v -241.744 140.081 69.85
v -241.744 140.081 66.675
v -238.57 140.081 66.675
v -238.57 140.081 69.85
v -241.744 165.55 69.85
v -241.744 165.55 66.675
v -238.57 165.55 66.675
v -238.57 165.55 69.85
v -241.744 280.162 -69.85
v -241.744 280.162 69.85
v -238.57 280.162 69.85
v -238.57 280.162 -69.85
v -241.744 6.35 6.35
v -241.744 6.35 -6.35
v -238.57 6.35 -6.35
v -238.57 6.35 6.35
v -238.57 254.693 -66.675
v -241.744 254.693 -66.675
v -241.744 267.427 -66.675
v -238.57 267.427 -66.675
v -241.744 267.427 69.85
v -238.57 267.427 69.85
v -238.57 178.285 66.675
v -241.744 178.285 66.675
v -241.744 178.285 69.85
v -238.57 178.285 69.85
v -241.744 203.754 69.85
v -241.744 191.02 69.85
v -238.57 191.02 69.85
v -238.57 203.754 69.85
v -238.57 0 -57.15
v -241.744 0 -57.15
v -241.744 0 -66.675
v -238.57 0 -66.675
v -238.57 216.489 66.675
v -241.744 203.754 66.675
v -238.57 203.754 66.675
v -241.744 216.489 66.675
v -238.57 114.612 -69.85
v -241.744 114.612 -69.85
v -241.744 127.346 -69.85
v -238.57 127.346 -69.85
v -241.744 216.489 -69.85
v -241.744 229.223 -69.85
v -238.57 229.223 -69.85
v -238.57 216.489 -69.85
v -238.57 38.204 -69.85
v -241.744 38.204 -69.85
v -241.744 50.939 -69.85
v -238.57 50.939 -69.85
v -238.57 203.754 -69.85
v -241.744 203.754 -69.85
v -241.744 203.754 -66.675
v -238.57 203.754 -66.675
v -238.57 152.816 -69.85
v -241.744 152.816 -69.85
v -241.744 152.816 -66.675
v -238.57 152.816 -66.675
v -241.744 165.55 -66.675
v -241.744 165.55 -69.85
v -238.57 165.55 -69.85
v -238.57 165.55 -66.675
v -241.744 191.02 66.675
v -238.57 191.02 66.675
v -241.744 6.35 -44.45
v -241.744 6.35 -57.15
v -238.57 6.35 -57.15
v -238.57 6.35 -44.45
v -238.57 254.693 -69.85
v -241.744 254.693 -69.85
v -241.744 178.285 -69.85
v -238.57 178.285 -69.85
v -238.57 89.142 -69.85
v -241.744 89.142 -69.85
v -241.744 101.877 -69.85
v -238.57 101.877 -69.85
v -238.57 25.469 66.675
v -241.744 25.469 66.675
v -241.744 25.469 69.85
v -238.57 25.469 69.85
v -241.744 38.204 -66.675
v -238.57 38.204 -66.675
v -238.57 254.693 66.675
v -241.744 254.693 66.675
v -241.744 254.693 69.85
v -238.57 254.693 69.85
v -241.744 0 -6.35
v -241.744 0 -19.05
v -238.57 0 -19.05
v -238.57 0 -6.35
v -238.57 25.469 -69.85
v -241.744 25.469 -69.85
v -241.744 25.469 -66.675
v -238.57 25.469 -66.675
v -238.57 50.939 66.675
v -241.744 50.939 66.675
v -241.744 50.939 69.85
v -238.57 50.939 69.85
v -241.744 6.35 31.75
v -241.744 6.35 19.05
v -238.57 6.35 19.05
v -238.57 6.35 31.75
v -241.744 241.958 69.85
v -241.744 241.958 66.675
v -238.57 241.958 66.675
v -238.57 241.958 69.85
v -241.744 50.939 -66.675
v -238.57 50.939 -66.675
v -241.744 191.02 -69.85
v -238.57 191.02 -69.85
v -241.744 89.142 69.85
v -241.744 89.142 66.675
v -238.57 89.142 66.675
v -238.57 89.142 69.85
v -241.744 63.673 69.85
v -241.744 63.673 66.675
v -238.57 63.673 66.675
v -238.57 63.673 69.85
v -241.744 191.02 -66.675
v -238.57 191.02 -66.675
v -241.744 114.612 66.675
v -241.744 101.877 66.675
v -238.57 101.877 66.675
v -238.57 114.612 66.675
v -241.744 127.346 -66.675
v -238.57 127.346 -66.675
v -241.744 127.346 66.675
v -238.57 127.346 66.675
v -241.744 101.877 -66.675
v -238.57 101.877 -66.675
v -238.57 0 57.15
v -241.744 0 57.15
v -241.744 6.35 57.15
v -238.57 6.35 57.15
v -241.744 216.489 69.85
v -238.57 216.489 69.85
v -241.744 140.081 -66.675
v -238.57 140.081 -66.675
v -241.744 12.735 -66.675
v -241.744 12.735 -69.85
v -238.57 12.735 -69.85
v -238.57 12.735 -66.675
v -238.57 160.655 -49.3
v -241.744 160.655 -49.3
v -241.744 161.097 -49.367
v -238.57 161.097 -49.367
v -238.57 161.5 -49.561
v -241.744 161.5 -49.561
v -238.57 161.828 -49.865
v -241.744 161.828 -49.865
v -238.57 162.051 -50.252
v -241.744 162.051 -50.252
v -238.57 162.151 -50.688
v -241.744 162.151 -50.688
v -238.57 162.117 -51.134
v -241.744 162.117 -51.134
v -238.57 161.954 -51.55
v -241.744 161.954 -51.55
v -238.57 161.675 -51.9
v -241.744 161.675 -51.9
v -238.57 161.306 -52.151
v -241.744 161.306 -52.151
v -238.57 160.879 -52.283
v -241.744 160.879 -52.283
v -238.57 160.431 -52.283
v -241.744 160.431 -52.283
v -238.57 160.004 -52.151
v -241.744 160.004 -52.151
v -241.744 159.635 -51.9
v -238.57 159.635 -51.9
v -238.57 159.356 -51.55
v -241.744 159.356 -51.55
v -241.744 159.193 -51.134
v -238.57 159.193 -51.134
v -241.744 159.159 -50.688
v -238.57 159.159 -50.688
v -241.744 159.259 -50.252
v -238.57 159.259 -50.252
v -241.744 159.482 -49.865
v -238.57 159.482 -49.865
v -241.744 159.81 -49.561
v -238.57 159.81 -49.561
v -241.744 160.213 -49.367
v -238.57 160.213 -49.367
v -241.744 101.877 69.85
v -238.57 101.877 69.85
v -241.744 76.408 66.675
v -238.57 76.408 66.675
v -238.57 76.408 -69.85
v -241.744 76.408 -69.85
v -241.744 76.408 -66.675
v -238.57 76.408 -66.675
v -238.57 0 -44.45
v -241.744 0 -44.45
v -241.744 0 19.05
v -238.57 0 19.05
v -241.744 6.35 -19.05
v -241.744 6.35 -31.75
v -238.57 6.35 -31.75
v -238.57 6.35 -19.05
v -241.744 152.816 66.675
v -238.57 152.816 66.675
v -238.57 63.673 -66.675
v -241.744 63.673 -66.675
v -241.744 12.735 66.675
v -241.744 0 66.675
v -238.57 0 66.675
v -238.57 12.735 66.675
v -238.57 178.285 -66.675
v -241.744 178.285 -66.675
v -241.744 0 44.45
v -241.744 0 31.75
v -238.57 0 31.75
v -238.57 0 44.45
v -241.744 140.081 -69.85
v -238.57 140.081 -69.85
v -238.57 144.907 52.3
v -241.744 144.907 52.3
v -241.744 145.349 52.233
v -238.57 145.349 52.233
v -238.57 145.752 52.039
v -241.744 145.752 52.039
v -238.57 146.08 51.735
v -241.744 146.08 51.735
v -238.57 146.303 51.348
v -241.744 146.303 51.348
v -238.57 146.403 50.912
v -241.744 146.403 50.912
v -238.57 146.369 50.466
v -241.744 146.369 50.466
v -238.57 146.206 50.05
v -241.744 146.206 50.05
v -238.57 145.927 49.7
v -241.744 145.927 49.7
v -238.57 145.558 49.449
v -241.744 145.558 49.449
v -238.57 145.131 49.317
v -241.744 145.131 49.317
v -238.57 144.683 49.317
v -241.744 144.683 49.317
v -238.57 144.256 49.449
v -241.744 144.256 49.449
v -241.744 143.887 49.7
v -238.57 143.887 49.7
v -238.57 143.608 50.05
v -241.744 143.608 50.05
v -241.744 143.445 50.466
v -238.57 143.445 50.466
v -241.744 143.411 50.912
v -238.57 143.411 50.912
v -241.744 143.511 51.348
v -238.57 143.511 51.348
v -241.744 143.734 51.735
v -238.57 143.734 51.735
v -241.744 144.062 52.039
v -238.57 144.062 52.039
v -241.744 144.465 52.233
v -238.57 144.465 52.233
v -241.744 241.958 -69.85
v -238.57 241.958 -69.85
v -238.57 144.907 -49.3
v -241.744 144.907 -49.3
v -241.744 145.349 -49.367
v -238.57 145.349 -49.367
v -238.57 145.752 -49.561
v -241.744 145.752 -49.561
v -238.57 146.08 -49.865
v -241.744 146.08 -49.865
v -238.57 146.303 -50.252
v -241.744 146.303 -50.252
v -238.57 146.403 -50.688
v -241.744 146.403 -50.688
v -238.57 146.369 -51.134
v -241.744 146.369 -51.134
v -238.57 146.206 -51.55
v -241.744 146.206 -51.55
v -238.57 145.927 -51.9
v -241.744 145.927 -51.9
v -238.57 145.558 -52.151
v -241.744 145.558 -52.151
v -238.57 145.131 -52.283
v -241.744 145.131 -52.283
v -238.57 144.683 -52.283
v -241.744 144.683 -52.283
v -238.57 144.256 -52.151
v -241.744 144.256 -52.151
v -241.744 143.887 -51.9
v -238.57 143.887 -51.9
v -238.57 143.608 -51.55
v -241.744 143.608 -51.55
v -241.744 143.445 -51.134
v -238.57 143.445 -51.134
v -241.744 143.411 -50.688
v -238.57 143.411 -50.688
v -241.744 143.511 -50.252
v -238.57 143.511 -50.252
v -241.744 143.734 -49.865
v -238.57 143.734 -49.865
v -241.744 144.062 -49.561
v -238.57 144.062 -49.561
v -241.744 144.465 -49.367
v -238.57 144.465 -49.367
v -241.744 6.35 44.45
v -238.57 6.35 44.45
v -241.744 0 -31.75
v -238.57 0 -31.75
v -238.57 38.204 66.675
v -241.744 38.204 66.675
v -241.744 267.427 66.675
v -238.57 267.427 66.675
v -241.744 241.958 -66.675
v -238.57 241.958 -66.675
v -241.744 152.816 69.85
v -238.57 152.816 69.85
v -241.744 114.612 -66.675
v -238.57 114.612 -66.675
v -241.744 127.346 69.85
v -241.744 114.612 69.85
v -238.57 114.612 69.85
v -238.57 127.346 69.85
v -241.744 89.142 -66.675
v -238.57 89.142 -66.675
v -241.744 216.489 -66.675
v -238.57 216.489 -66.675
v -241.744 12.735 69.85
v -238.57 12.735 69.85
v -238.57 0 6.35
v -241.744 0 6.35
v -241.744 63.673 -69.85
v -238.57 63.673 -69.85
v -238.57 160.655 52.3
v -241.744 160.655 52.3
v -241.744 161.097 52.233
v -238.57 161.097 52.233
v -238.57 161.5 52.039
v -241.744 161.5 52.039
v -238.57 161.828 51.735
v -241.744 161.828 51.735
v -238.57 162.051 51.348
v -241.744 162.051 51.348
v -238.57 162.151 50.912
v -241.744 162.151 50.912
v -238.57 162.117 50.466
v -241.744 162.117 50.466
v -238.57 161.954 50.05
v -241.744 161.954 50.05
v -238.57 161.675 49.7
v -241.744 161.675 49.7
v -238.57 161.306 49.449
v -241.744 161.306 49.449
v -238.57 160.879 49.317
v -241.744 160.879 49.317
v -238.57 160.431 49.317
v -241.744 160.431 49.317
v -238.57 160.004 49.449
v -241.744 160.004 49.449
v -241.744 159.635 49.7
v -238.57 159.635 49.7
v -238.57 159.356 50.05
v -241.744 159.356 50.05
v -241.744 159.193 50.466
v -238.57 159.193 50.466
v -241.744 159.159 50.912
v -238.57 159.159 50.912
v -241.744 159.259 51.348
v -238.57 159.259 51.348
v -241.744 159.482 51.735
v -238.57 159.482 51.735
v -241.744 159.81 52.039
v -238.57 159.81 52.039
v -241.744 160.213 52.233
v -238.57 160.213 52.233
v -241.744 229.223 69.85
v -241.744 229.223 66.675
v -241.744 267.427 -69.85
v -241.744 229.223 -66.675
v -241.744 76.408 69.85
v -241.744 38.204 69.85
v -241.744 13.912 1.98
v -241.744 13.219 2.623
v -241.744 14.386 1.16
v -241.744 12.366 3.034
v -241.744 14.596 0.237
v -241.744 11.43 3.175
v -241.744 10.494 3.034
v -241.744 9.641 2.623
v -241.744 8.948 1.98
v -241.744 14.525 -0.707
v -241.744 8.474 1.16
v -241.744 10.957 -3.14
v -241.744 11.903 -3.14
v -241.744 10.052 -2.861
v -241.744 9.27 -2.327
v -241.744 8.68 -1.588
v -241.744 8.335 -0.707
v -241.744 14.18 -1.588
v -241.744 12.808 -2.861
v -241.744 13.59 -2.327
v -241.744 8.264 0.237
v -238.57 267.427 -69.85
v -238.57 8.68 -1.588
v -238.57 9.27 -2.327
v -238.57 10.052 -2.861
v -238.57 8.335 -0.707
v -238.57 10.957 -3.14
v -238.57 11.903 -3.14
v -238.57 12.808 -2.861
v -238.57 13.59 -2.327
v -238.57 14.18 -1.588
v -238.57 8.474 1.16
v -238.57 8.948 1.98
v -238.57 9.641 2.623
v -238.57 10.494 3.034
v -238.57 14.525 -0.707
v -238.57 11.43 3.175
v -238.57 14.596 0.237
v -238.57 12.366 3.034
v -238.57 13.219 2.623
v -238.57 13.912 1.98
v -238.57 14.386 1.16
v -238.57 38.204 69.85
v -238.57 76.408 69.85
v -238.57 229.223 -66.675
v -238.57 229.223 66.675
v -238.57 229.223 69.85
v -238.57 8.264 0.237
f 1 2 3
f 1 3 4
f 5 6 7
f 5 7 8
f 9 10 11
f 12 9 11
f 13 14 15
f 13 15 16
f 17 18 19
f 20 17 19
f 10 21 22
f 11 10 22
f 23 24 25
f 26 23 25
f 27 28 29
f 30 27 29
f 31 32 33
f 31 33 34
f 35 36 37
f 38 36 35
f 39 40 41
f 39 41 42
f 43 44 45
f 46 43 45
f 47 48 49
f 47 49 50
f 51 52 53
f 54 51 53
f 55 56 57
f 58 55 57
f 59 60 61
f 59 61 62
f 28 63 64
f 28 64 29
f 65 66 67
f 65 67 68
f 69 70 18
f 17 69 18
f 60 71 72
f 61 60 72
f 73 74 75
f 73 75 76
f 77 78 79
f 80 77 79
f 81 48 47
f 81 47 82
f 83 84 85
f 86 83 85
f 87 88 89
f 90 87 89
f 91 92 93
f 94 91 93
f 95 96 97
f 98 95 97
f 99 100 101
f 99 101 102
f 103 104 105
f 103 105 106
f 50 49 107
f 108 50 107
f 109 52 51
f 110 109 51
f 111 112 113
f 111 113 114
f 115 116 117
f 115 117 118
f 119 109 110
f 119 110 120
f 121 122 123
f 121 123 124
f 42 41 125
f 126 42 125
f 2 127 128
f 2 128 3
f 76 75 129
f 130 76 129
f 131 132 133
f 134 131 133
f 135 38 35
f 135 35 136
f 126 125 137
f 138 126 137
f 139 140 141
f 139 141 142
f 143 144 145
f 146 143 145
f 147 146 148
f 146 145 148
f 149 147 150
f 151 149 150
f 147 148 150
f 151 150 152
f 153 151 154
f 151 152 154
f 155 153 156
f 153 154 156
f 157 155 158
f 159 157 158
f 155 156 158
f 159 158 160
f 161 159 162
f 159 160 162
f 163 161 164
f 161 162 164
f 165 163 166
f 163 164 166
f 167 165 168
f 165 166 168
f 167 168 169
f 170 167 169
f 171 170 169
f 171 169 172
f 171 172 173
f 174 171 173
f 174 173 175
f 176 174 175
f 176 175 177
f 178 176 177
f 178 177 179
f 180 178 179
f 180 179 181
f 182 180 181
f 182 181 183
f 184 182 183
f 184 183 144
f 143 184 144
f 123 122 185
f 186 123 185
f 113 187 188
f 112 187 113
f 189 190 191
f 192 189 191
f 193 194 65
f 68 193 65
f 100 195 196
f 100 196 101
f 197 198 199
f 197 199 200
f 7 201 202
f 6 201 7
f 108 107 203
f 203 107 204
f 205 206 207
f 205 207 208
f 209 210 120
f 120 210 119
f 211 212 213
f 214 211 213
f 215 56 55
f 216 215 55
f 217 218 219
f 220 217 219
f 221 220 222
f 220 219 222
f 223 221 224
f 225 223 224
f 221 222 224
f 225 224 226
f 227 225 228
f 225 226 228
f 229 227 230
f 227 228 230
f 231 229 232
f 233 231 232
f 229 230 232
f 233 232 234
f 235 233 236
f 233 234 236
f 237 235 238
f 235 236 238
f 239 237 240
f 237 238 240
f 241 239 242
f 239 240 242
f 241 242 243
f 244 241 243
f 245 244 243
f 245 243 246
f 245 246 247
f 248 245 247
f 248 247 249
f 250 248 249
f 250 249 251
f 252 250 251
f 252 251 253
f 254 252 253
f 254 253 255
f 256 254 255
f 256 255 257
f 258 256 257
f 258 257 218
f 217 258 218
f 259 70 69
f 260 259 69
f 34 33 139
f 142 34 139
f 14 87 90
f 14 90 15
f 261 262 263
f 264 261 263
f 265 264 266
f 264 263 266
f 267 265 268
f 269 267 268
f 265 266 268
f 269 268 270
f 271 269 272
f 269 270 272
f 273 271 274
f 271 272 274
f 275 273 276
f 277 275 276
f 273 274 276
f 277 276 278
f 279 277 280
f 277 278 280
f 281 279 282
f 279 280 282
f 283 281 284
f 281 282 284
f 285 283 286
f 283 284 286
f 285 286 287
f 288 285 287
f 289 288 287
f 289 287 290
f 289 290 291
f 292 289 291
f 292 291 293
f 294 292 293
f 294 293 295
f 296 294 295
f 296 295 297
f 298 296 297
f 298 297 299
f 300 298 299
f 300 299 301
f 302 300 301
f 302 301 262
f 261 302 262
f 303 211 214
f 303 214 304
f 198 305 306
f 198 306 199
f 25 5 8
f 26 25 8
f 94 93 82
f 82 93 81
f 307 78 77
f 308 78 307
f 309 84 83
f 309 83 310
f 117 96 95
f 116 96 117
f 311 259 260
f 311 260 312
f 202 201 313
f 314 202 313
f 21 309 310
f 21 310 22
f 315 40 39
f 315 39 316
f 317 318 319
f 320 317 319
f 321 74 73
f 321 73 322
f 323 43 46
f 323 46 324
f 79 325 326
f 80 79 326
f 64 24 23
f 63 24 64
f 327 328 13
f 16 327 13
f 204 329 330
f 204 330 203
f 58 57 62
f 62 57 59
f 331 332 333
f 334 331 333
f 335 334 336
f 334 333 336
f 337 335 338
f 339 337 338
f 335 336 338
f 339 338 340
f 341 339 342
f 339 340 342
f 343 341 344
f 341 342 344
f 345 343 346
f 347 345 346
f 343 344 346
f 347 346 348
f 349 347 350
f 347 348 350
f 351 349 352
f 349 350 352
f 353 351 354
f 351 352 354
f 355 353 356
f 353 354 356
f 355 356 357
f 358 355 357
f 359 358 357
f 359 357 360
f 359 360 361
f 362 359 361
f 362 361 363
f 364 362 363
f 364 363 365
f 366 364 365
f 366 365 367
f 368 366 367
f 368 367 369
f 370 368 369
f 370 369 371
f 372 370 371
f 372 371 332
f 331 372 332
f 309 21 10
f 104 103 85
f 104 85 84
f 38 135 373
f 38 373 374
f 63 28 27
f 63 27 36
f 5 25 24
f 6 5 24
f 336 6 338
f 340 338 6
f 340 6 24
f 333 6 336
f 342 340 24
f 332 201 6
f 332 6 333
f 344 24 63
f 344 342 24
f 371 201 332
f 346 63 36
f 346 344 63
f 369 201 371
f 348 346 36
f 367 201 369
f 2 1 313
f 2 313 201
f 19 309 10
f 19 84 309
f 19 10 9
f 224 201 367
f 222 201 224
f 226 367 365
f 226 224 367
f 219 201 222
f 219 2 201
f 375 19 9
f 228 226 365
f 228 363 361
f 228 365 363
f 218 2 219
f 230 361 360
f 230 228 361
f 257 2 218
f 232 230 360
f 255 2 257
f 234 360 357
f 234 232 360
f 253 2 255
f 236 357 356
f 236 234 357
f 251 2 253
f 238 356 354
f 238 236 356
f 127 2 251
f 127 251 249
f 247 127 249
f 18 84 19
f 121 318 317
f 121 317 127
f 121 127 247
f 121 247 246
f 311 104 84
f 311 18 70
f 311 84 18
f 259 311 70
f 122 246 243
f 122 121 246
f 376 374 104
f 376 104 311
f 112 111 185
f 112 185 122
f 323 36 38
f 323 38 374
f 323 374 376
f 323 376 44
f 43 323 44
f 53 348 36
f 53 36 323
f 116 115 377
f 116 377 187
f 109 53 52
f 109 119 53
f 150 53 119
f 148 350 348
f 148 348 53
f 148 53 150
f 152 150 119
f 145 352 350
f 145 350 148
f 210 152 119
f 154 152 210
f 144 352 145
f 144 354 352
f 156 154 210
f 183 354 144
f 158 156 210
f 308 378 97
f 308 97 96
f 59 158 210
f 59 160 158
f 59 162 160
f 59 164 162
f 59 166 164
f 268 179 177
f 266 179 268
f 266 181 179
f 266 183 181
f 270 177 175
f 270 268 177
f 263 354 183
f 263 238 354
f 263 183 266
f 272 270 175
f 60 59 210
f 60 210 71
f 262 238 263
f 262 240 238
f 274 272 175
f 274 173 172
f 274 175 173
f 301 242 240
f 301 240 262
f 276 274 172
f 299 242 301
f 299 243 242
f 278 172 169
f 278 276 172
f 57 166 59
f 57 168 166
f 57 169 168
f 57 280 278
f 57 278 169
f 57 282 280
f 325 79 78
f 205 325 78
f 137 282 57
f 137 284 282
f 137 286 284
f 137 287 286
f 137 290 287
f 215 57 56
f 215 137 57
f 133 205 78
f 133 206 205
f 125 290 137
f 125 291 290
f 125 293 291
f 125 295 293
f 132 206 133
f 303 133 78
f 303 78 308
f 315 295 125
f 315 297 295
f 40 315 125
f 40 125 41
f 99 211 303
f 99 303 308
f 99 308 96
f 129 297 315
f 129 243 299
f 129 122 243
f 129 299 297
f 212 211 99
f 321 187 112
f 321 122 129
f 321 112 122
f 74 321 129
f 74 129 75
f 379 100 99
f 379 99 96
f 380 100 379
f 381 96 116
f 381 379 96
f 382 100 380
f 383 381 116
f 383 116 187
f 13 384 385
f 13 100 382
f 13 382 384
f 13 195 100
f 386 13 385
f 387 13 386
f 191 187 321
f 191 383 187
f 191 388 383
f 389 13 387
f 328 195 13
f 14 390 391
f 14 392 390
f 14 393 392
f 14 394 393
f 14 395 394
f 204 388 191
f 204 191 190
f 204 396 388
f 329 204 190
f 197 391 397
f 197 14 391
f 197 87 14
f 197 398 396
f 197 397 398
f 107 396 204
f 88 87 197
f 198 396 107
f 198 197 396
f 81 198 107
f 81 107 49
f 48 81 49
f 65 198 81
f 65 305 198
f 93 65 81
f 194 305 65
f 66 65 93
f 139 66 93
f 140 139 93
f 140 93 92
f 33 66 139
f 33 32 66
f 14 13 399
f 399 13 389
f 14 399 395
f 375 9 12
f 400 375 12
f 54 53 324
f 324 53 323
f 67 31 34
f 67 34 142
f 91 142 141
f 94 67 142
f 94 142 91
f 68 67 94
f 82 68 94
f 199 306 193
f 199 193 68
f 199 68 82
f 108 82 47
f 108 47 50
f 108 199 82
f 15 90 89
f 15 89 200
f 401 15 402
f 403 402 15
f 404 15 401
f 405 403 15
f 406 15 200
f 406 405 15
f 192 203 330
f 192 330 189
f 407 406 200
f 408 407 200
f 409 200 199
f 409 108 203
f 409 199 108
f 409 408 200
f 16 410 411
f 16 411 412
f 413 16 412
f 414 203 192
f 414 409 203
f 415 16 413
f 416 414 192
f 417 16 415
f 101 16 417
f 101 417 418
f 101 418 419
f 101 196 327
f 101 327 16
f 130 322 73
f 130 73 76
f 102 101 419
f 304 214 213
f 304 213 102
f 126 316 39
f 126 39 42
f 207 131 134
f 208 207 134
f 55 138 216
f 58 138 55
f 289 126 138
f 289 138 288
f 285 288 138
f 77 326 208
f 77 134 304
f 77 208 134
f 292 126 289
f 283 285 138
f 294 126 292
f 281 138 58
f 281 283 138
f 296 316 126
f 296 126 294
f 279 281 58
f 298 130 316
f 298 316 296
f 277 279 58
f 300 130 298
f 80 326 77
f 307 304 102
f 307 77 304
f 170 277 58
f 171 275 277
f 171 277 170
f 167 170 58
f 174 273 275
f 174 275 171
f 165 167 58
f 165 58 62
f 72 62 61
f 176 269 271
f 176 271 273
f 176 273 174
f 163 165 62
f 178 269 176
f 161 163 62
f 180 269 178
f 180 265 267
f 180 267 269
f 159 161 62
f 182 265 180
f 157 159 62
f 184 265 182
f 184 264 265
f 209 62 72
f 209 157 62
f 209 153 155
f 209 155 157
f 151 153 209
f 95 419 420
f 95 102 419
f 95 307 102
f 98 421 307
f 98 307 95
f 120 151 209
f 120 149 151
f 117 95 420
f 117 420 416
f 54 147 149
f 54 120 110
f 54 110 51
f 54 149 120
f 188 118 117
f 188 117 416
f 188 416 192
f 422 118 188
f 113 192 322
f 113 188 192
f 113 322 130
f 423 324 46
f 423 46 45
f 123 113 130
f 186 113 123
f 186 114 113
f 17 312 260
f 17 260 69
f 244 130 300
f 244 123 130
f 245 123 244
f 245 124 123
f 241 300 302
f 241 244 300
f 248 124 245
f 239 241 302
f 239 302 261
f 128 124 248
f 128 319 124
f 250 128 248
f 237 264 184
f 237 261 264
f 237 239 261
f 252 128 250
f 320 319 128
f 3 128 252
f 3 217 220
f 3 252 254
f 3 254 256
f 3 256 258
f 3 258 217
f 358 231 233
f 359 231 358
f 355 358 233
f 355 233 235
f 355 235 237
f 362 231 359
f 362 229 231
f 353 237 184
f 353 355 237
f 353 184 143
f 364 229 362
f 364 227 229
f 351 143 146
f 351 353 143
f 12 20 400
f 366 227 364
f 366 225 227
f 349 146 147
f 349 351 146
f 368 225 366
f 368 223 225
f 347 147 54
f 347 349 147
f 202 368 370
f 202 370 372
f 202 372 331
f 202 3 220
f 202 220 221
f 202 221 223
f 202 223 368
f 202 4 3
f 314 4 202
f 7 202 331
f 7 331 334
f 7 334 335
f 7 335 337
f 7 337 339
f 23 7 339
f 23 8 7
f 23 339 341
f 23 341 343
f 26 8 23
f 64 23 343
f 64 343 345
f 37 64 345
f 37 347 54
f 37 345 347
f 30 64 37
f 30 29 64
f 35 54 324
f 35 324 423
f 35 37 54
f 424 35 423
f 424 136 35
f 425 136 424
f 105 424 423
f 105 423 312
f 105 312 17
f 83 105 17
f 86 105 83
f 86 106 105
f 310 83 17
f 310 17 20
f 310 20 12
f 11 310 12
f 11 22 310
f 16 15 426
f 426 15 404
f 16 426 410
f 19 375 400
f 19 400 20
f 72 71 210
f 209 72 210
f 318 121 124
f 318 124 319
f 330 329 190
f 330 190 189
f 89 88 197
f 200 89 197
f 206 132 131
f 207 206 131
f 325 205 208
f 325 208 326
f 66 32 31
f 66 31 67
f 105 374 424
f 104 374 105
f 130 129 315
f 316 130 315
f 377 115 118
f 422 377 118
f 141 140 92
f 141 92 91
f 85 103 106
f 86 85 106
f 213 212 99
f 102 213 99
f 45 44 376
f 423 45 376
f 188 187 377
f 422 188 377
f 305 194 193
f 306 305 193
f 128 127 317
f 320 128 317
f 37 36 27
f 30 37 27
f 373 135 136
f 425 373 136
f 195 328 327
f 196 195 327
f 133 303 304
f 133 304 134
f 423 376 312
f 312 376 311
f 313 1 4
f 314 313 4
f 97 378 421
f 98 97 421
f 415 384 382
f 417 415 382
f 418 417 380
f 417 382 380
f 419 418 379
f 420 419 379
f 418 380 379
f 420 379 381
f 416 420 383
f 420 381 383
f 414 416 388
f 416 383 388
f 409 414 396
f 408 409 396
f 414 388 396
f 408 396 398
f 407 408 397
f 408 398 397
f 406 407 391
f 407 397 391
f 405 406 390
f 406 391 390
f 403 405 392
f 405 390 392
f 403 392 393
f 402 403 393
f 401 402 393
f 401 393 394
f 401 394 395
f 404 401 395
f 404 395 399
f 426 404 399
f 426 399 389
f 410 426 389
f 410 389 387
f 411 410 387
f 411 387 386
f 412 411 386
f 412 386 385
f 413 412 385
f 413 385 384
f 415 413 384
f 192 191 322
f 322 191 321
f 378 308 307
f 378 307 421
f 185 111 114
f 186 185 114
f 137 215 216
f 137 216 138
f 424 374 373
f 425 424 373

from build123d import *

# Parameters (mm, degrees)
SKETCH1_W                   = 483.489
SKETCH1_H                   = 139.7
BOSS_EXTRUDE1_DEPTH         = 6.35
SKETCH2_W                   = 483.489
SKETCH2_H                   = 139.7
SKETCH2_W_2                 = 477.139
SKETCH2_H_2                 = 133.35
BOSS_EXTRUDE2_DEPTH         = 299.212
SKETCH3_W                   = 5.588
SKETCH3_H                   = 16.933333333
SKETCH3_H_2                 = 16.933333334
DOOR_SLOT_DEPTH             = 12.7
SKETCH4_W                   = 6.35
SKETCH4_H                   = 15.9512
DOOR_GUIDE_HOLES_DEPTH      = 3.175
LEVERHOLE_CUT_REACH         = 141.7
LEVER_HOLES_R               = 1.5
LEVER_HOLES_W               = 25.4
LEVER_HOLES_H               = 7.62
LEVER_HOLES_W_2             = 4
LEVER_HOLES_H_2             = 6.35
LEVER_HOLES_2_R             = 1.5
LBRACKET_THRU_HOLES_DEPTH   = 140.7
SKETCH8_R                   = 3.175
TETHER_HOLE_DEPTH           = 484.489
DOOR_GUIDE_ROOF_SLOTS_REACH = 141.7
SKETCH16_W                  = 9.525
SKETCH16_H                  = 15.744198015
SKETCH16_W_2                = 483.489
SKETCH16_H_2                = 25.4
SKETCH17_W                  = 480.314
SKETCH17_H                  = 280.162
CUT_EXTRUDE1_DEPTH          = 140.7
LEFT_RIGHT_W                = 12.7
LEFT_RIGHT_H                = 6.35
LEFT_RIGHT_W_2              = 3.175
LEFT_RIGHT_H_2              = 12.734636364
LEFT_RIGHT_H_3              = 12.734636363
CUT_EXTRUDE2_DEPTH          = 4.175
SKETCH18_R                  = 1.499997
CUT_EXTRUDE3_DEPTH          = 4.175


with BuildPart() as part:
    # Sketch1 → Boss-Extrude1 (new body)
    with BuildSketch(Plane(origin=(0, 0, 0), x_dir=(1, 0, 0), z_dir=(0, 1, 0))):
        Rectangle(SKETCH1_W, SKETCH1_H)
    extrude(amount=BOSS_EXTRUDE1_DEPTH)

    # Sketch2 → Boss-Extrude2 (add)
    with BuildSketch(Plane(origin=(0, 6.35, 0), x_dir=(1, 0, 0), z_dir=(0, 1, 0))):
        Rectangle(SKETCH2_W, SKETCH2_H)
        Rectangle(SKETCH2_W_2, SKETCH2_H_2, mode=Mode.SUBTRACT)
    extrude(amount=BOSS_EXTRUDE2_DEPTH)

    # Sketch3 → Door Slot (cut)
    with BuildSketch(Plane.XY.offset(69.85)):
        with BuildLine():
            Line((76.5175, 292.354), (76.5175, 6.35))
            Line((76.5175, 6.35), (83.1215, 6.35))
            Line((83.1215, 6.35), (83.1215, 283.240675824))
            ThreePointArc((83.1215, 283.240675824), (83.865448776, 285.036727048), (85.6615, 285.780675824))
            Line((85.6615, 285.780675824), (96.0755, 285.780675824))
            Line((96.0755, 285.780675824), (96.0755, 292.354))
            Line((96.0755, 292.354), (76.5175, 292.354))
        make_face()
        with Locations((66.6115, 80.433333334)):
            Rectangle(SKETCH3_W, SKETCH3_H)
        with Locations((66.6115, 50.8)):
            Rectangle(SKETCH3_W, SKETCH3_H_2)
        with Locations((66.6115, 21.166666667)):
            Rectangle(SKETCH3_W, SKETCH3_H)
        with BuildLine():
            Line((-83.1215, 283.240675824), (-83.1215, 6.35))
            Line((-83.1215, 6.35), (-76.5175, 6.35))
            Line((-76.5175, 6.35), (-76.5175, 292.354))
            Line((-76.5175, 292.354), (-96.0755, 292.354))
            Line((-96.0755, 292.354), (-96.0755, 285.780675824))
            Line((-96.0755, 285.780675824), (-85.6615, 285.780675824))
            ThreePointArc((-85.6615, 285.780675824), (-83.865448776, 285.036727048), (-83.1215, 283.240675824))
        make_face()
        with Locations((-66.6115, 80.433333334)):
            Rectangle(SKETCH3_W, SKETCH3_H)
        with Locations((-66.6115, 50.8)):
            Rectangle(SKETCH3_W, SKETCH3_H_2)
        with Locations((-66.6115, 21.166666667)):
            Rectangle(SKETCH3_W, SKETCH3_H)
    extrude(amount=-DOOR_SLOT_DEPTH, mode=Mode.SUBTRACT)

    # Sketch4 → Door Guide Holes (cut)
    with BuildSketch(Plane.XY.offset(-66.675)):
        with Locations((73.3425, 256.2352)):
            Rectangle(SKETCH4_W, SKETCH4_H)
        with Locations((73.3425, 227.584)):
            Rectangle(SKETCH4_W, SKETCH4_H)
        with Locations((73.3425, 198.9328)):
            Rectangle(SKETCH4_W, SKETCH4_H)
        with Locations((73.3425, 170.2816)):
            Rectangle(SKETCH4_W, SKETCH4_H)
        with Locations((73.3425, 141.6304)):
            Rectangle(SKETCH4_W, SKETCH4_H)
        with Locations((73.3425, 112.9792)):
            Rectangle(SKETCH4_W, SKETCH4_H)
        with Locations((73.3425, 84.328)):
            Rectangle(SKETCH4_W, SKETCH4_H)
        with Locations((73.3425, 55.6768)):
            Rectangle(SKETCH4_W, SKETCH4_H)
        with Locations((73.3425, 27.0256)):
            Rectangle(SKETCH4_W, SKETCH4_H)
        with Locations((-99.2505, 284.8864)):
            Rectangle(SKETCH4_W, SKETCH4_H)
        with Locations((-99.2505, 256.2352)):
            Rectangle(SKETCH4_W, SKETCH4_H)
        with Locations((-99.2505, 227.584)):
            Rectangle(SKETCH4_W, SKETCH4_H)
        with Locations((-99.2505, 198.9328)):
            Rectangle(SKETCH4_W, SKETCH4_H)
        with Locations((-99.2505, 170.2816)):
            Rectangle(SKETCH4_W, SKETCH4_H)
        with Locations((-99.2505, 141.6304)):
            Rectangle(SKETCH4_W, SKETCH4_H)
        with Locations((-99.2505, 112.9792)):
            Rectangle(SKETCH4_W, SKETCH4_H)
        with Locations((-99.2505, 84.328)):
            Rectangle(SKETCH4_W, SKETCH4_H)
        with Locations((-99.2505, 55.6768)):
            Rectangle(SKETCH4_W, SKETCH4_H)
        with Locations((-99.2505, 27.0256)):
            Rectangle(SKETCH4_W, SKETCH4_H)
        with Locations((99.2505, 284.8864)):
            Rectangle(SKETCH4_W, SKETCH4_H)
        with Locations((99.2505, 256.2352)):
            Rectangle(SKETCH4_W, SKETCH4_H)
        with Locations((99.2505, 227.584)):
            Rectangle(SKETCH4_W, SKETCH4_H)
        with Locations((99.2505, 198.9328)):
            Rectangle(SKETCH4_W, SKETCH4_H)
        with Locations((99.2505, 170.2816)):
            Rectangle(SKETCH4_W, SKETCH4_H)
        with Locations((99.2505, 141.6304)):
            Rectangle(SKETCH4_W, SKETCH4_H)
        with Locations((99.2505, 112.9792)):
            Rectangle(SKETCH4_W, SKETCH4_H)
        with Locations((99.2505, 84.328)):
            Rectangle(SKETCH4_W, SKETCH4_H)
        with Locations((99.2505, 55.6768)):
            Rectangle(SKETCH4_W, SKETCH4_H)
        with Locations((99.2505, 27.0256)):
            Rectangle(SKETCH4_W, SKETCH4_H)
        with Locations((-73.3425, 284.8864)):
            Rectangle(SKETCH4_W, SKETCH4_H)
        with Locations((-73.3425, 256.2352)):
            Rectangle(SKETCH4_W, SKETCH4_H)
        with Locations((-73.3425, 227.584)):
            Rectangle(SKETCH4_W, SKETCH4_H)
        with Locations((-73.3425, 198.9328)):
            Rectangle(SKETCH4_W, SKETCH4_H)
        with Locations((-73.3425, 170.2816)):
            Rectangle(SKETCH4_W, SKETCH4_H)
        with Locations((-73.3425, 141.6304)):
            Rectangle(SKETCH4_W, SKETCH4_H)
        with Locations((-73.3425, 112.9792)):
            Rectangle(SKETCH4_W, SKETCH4_H)
        with Locations((-73.3425, 84.328)):
            Rectangle(SKETCH4_W, SKETCH4_H)
        with Locations((-73.3425, 55.6768)):
            Rectangle(SKETCH4_W, SKETCH4_H)
        with Locations((-73.3425, 27.0256)):
            Rectangle(SKETCH4_W, SKETCH4_H)
        with Locations((73.3425, 284.8864)):
            Rectangle(SKETCH4_W, SKETCH4_H)
    extrude(amount=-DOOR_GUIDE_HOLES_DEPTH, mode=Mode.SUBTRACT)

    # Lever Holes → LeverHole Cut (cut, up to next)
    with BuildSketch(Plane.XY.offset(-69.85), mode=Mode.PRIVATE) as leverhole_cut_sk1:
        with Locations((222.6945, 160.655)):
            Circle(LEVER_HOLES_R)
    leverhole_cut_tool1 = extrude(leverhole_cut_sk1.sketch, amount=LEVERHOLE_CUT_REACH, mode=Mode.PRIVATE) & part.part
    add(leverhole_cut_tool1.solids().sort_by_distance((222.6945, 160.655, -69.85))[0], mode=Mode.SUBTRACT)
    # Lever Holes → LeverHole Cut (cut, up to next)
    with BuildSketch(Plane.XY.offset(-69.85), mode=Mode.PRIVATE) as leverhole_cut_sk2:
        with Locations((222.6945, 144.907)):
            Circle(LEVER_HOLES_R)
    leverhole_cut_tool2 = extrude(leverhole_cut_sk2.sketch, amount=LEVERHOLE_CUT_REACH, mode=Mode.PRIVATE) & part.part
    add(leverhole_cut_tool2.solids().sort_by_distance((222.6945, 144.907, -69.85))[0], mode=Mode.SUBTRACT)
    # Lever Holes → LeverHole Cut (cut, up to next)
    with BuildSketch(Plane.XY.offset(-69.85), mode=Mode.PRIVATE) as leverhole_cut_sk3:
        with Locations((-222.6945, 160.655)):
            Circle(LEVER_HOLES_R)
    leverhole_cut_tool3 = extrude(leverhole_cut_sk3.sketch, amount=LEVERHOLE_CUT_REACH, mode=Mode.PRIVATE) & part.part
    add(leverhole_cut_tool3.solids().sort_by_distance((-222.6945, 160.655, -69.85))[0], mode=Mode.SUBTRACT)
    # Lever Holes → LeverHole Cut (cut, up to next)
    with BuildSketch(Plane.XY.offset(-69.85), mode=Mode.PRIVATE) as leverhole_cut_sk4:
        with Locations((-222.6945, 144.907)):
            Circle(LEVER_HOLES_R)
    leverhole_cut_tool4 = extrude(leverhole_cut_sk4.sketch, amount=LEVERHOLE_CUT_REACH, mode=Mode.PRIVATE) & part.part
    add(leverhole_cut_tool4.solids().sort_by_distance((-222.6945, 144.907, -69.85))[0], mode=Mode.SUBTRACT)
    # Lever Holes → LeverHole Cut (cut, up to next)
    with BuildSketch(Plane.XY.offset(-69.85), mode=Mode.PRIVATE) as leverhole_cut_sk5:
        with Locations((-46.9175, 33.8749894)):
            Rectangle(LEVER_HOLES_W, LEVER_HOLES_H)
    leverhole_cut_tool5 = extrude(leverhole_cut_sk5.sketch, amount=LEVERHOLE_CUT_REACH, mode=Mode.PRIVATE) & part.part
    add(leverhole_cut_tool5.solids().sort_by_distance((-46.9175, 33.874989, -69.85))[0], mode=Mode.SUBTRACT)
    # Lever Holes → LeverHole Cut (cut, up to next)
    with BuildSketch(Plane.XY.offset(-69.85), mode=Mode.PRIVATE) as leverhole_cut_sk6:
        with Locations((-58.1675, 13.175)):
            Rectangle(LEVER_HOLES_W_2, LEVER_HOLES_H_2)
    leverhole_cut_tool6 = extrude(leverhole_cut_sk6.sketch, amount=LEVERHOLE_CUT_REACH, mode=Mode.PRIVATE) & part.part
    add(leverhole_cut_tool6.solids().sort_by_distance((-58.1675, 13.175, -69.85))[0], mode=Mode.SUBTRACT)
    # Lever Holes → LeverHole Cut (cut, up to next)
    with BuildSketch(Plane.XY.offset(-69.85), mode=Mode.PRIVATE) as leverhole_cut_sk7:
        with Locations((-12.1675068, 13.175)):
            Rectangle(LEVER_HOLES_W_2, LEVER_HOLES_H_2)
    leverhole_cut_tool7 = extrude(leverhole_cut_sk7.sketch, amount=LEVERHOLE_CUT_REACH, mode=Mode.PRIVATE) & part.part
    add(leverhole_cut_tool7.solids().sort_by_distance((-12.167507, 13.175, -69.85))[0], mode=Mode.SUBTRACT)
    # Lever Holes → LeverHole Cut (cut, up to next)
    with BuildSketch(Plane.XY.offset(-69.85), mode=Mode.PRIVATE) as leverhole_cut_sk8:
        with Locations((12.1675068, 13.175)):
            Rectangle(LEVER_HOLES_W_2, LEVER_HOLES_H_2)
    leverhole_cut_tool8 = extrude(leverhole_cut_sk8.sketch, amount=LEVERHOLE_CUT_REACH, mode=Mode.PRIVATE) & part.part
    add(leverhole_cut_tool8.solids().sort_by_distance((12.167507, 13.175, -69.85))[0], mode=Mode.SUBTRACT)
    # Lever Holes → LeverHole Cut (cut, up to next)
    with BuildSketch(Plane.XY.offset(-69.85), mode=Mode.PRIVATE) as leverhole_cut_sk9:
        with Locations((46.9175, 33.8749894)):
            Rectangle(LEVER_HOLES_W, LEVER_HOLES_H)
    leverhole_cut_tool9 = extrude(leverhole_cut_sk9.sketch, amount=LEVERHOLE_CUT_REACH, mode=Mode.PRIVATE) & part.part
    add(leverhole_cut_tool9.solids().sort_by_distance((46.9175, 33.874989, -69.85))[0], mode=Mode.SUBTRACT)
    # Lever Holes → LeverHole Cut (cut, up to next)
    with BuildSketch(Plane.XY.offset(-69.85), mode=Mode.PRIVATE) as leverhole_cut_sk10:
        with Locations((58.1675, 13.175)):
            Rectangle(LEVER_HOLES_W_2, LEVER_HOLES_H_2)
    leverhole_cut_tool10 = extrude(leverhole_cut_sk10.sketch, amount=LEVERHOLE_CUT_REACH, mode=Mode.PRIVATE) & part.part
    add(leverhole_cut_tool10.solids().sort_by_distance((58.1675, 13.175, -69.85))[0], mode=Mode.SUBTRACT)

    # Lever Holes<2> → Lbracket Thru Holes (cut, through all)
    with BuildSketch(Plane.XY.offset(-69.85)):
        with Locations((-222.6945, 160.655)):
            Circle(LEVER_HOLES_2_R)
        with Locations((-222.6945, 144.907)):
            Circle(LEVER_HOLES_2_R)
        with Locations((222.6945, 160.655)):
            Circle(LEVER_HOLES_2_R)
        with Locations((222.6945, 144.907)):
            Circle(LEVER_HOLES_2_R)
    extrude(amount=LBRACKET_THRU_HOLES_DEPTH, mode=Mode.SUBTRACT)

    # Sketch8 → Tether Hole (cut, through all)
    with BuildSketch(Plane.ZY.offset(241.7445)):
        with Locations((0, 11.43)):
            Circle(SKETCH8_R)
    extrude(amount=-TETHER_HOLE_DEPTH, mode=Mode.SUBTRACT)

    # Sketch16 → Door Guide Roof Slots (cut, up to next)
    with BuildSketch(Plane.XY.offset(69.85), mode=Mode.PRIVATE) as door_guide_roof_slots_sk1:
        with Locations((54.102, 267.525769227)):
            Rectangle(SKETCH16_W, SKETCH16_H)
    door_guide_roof_slots_tool1 = extrude(door_guide_roof_slots_sk1.sketch, amount=-DOOR_GUIDE_ROOF_SLOTS_REACH, mode=Mode.PRIVATE) & part.part
    add(door_guide_roof_slots_tool1.solids().sort_by_distance((54.102, 267.525769, 69.85))[0], mode=Mode.SUBTRACT)
    # Sketch16 → Door Guide Roof Slots (cut, up to next)
    with BuildSketch(Plane.XY.offset(69.85), mode=Mode.PRIVATE) as door_guide_roof_slots_sk2:
        with Locations((118.491, 267.525769227)):
            Rectangle(SKETCH16_W, SKETCH16_H)
    door_guide_roof_slots_tool2 = extrude(door_guide_roof_slots_sk2.sketch, amount=-DOOR_GUIDE_ROOF_SLOTS_REACH, mode=Mode.PRIVATE) & part.part
    add(door_guide_roof_slots_tool2.solids().sort_by_distance((118.491, 267.525769, 69.85))[0], mode=Mode.SUBTRACT)
    # Sketch16 → Door Guide Roof Slots (cut, up to next)
    with BuildSketch(Plane.XY.offset(69.85), mode=Mode.PRIVATE) as door_guide_roof_slots_sk3:
        with Locations((-118.491, 267.525769227)):
            Rectangle(SKETCH16_W, SKETCH16_H)
    door_guide_roof_slots_tool3 = extrude(door_guide_roof_slots_sk3.sketch, amount=-DOOR_GUIDE_ROOF_SLOTS_REACH, mode=Mode.PRIVATE) & part.part
    add(door_guide_roof_slots_tool3.solids().sort_by_distance((-118.491, 267.525769, 69.85))[0], mode=Mode.SUBTRACT)
    # Sketch16 → Door Guide Roof Slots (cut, up to next)
    with BuildSketch(Plane.XY.offset(69.85), mode=Mode.PRIVATE) as door_guide_roof_slots_sk4:
        with Locations((-54.102, 267.525769227)):
            Rectangle(SKETCH16_W, SKETCH16_H)
    door_guide_roof_slots_tool4 = extrude(door_guide_roof_slots_sk4.sketch, amount=-DOOR_GUIDE_ROOF_SLOTS_REACH, mode=Mode.PRIVATE) & part.part
    add(door_guide_roof_slots_tool4.solids().sort_by_distance((-54.102, 267.525769, 69.85))[0], mode=Mode.SUBTRACT)
    # Sketch16 → Door Guide Roof Slots (cut, up to next)
    with BuildSketch(Plane.XY.offset(69.85), mode=Mode.PRIVATE) as door_guide_roof_slots_sk5:
        with Locations((0, 292.862)):
            Rectangle(SKETCH16_W_2, SKETCH16_H_2)
    door_guide_roof_slots_tool5 = extrude(door_guide_roof_slots_sk5.sketch, amount=-DOOR_GUIDE_ROOF_SLOTS_REACH, mode=Mode.PRIVATE) & part.part
    add(door_guide_roof_slots_tool5.solids().sort_by_distance((0, 292.862, 69.85))[0], mode=Mode.SUBTRACT)

    # Sketch17 → Cut-Extrude1 (cut, through all)
    with BuildSketch(Plane.XY.offset(69.85)):
        with Locations((1.5875, 140.081)):
            Rectangle(SKETCH17_W, SKETCH17_H)
    extrude(amount=-CUT_EXTRUDE1_DEPTH, mode=Mode.SUBTRACT)

    # Left/Right → Cut-Extrude2 (cut, through all)
    with BuildSketch(Plane.ZY.offset(241.7445)):
        with Locations((50.8, 3.175)):
            Rectangle(LEFT_RIGHT_W, LEFT_RIGHT_H)
        with Locations((68.2625, 6.367318182)):
            Rectangle(LEFT_RIGHT_W_2, LEFT_RIGHT_H_2)
        with Locations((25.4, 3.175)):
            Rectangle(LEFT_RIGHT_W, LEFT_RIGHT_H)
        with Locations((68.2625, 31.836590909)):
            Rectangle(LEFT_RIGHT_W_2, LEFT_RIGHT_H_2)
        with Locations((0, 3.175)):
            Rectangle(LEFT_RIGHT_W, LEFT_RIGHT_H)
        with Locations((68.2625, 57.305863637)):
            Rectangle(LEFT_RIGHT_W_2, LEFT_RIGHT_H_3)
        with Locations((-25.4, 3.175)):
            Rectangle(LEFT_RIGHT_W, LEFT_RIGHT_H)
        with Locations((68.2625, 82.775136363)):
            Rectangle(LEFT_RIGHT_W_2, LEFT_RIGHT_H_3)
        with Locations((-50.8, 3.175)):
            Rectangle(LEFT_RIGHT_W, LEFT_RIGHT_H)
        with Locations((68.2625, 108.244409091)):
            Rectangle(LEFT_RIGHT_W_2, LEFT_RIGHT_H_2)
        with Locations((-68.2625, 6.367318182)):
            Rectangle(LEFT_RIGHT_W_2, LEFT_RIGHT_H_2)
        with Locations((68.2625, 133.713681818)):
            Rectangle(LEFT_RIGHT_W_2, LEFT_RIGHT_H_2)
        with Locations((-68.2625, 31.836590909)):
            Rectangle(LEFT_RIGHT_W_2, LEFT_RIGHT_H_2)
        with Locations((68.2625, 159.182954546)):
            Rectangle(LEFT_RIGHT_W_2, LEFT_RIGHT_H_3)
        with Locations((-68.2625, 57.305863637)):
            Rectangle(LEFT_RIGHT_W_2, LEFT_RIGHT_H_3)
        with Locations((68.2625, 184.652227273)):
            Rectangle(LEFT_RIGHT_W_2, LEFT_RIGHT_H_2)
        with Locations((-68.2625, 82.775136363)):
            Rectangle(LEFT_RIGHT_W_2, LEFT_RIGHT_H_3)
        with Locations((68.2625, 210.1215)):
            Rectangle(LEFT_RIGHT_W_2, LEFT_RIGHT_H_2)
        with Locations((-68.2625, 108.244409091)):
            Rectangle(LEFT_RIGHT_W_2, LEFT_RIGHT_H_2)
        with Locations((68.2625, 235.590772727)):
            Rectangle(LEFT_RIGHT_W_2, LEFT_RIGHT_H_2)
        with Locations((-68.2625, 133.713681818)):
            Rectangle(LEFT_RIGHT_W_2, LEFT_RIGHT_H_2)
        with Locations((68.2625, 261.060045455)):
            Rectangle(LEFT_RIGHT_W_2, LEFT_RIGHT_H_3)
        with Locations((-68.2625, 159.182954546)):
            Rectangle(LEFT_RIGHT_W_2, LEFT_RIGHT_H_3)
        with Locations((-68.2625, 184.652227273)):
            Rectangle(LEFT_RIGHT_W_2, LEFT_RIGHT_H_2)
        with Locations((-68.2625, 210.1215)):
            Rectangle(LEFT_RIGHT_W_2, LEFT_RIGHT_H_2)
        with Locations((-68.2625, 235.590772727)):
            Rectangle(LEFT_RIGHT_W_2, LEFT_RIGHT_H_2)
        with Locations((-68.2625, 261.060045455)):
            Rectangle(LEFT_RIGHT_W_2, LEFT_RIGHT_H_3)
    extrude(amount=-CUT_EXTRUDE2_DEPTH, mode=Mode.SUBTRACT)

    # Sketch18 → Cut-Extrude3 (cut, through all)
    with BuildSketch(Plane.ZY.offset(241.7445)):
        with Locations((-50.8, 160.655)):
            Circle(SKETCH18_R)
        with Locations((-50.8, 144.907)):
            Circle(SKETCH18_R)
        with Locations((50.8, 144.907)):
            Circle(SKETCH18_R)
        with Locations((50.8, 160.655)):
            Circle(SKETCH18_R)
    extrude(amount=-CUT_EXTRUDE3_DEPTH, mode=Mode.SUBTRACT)


solid = part.part
